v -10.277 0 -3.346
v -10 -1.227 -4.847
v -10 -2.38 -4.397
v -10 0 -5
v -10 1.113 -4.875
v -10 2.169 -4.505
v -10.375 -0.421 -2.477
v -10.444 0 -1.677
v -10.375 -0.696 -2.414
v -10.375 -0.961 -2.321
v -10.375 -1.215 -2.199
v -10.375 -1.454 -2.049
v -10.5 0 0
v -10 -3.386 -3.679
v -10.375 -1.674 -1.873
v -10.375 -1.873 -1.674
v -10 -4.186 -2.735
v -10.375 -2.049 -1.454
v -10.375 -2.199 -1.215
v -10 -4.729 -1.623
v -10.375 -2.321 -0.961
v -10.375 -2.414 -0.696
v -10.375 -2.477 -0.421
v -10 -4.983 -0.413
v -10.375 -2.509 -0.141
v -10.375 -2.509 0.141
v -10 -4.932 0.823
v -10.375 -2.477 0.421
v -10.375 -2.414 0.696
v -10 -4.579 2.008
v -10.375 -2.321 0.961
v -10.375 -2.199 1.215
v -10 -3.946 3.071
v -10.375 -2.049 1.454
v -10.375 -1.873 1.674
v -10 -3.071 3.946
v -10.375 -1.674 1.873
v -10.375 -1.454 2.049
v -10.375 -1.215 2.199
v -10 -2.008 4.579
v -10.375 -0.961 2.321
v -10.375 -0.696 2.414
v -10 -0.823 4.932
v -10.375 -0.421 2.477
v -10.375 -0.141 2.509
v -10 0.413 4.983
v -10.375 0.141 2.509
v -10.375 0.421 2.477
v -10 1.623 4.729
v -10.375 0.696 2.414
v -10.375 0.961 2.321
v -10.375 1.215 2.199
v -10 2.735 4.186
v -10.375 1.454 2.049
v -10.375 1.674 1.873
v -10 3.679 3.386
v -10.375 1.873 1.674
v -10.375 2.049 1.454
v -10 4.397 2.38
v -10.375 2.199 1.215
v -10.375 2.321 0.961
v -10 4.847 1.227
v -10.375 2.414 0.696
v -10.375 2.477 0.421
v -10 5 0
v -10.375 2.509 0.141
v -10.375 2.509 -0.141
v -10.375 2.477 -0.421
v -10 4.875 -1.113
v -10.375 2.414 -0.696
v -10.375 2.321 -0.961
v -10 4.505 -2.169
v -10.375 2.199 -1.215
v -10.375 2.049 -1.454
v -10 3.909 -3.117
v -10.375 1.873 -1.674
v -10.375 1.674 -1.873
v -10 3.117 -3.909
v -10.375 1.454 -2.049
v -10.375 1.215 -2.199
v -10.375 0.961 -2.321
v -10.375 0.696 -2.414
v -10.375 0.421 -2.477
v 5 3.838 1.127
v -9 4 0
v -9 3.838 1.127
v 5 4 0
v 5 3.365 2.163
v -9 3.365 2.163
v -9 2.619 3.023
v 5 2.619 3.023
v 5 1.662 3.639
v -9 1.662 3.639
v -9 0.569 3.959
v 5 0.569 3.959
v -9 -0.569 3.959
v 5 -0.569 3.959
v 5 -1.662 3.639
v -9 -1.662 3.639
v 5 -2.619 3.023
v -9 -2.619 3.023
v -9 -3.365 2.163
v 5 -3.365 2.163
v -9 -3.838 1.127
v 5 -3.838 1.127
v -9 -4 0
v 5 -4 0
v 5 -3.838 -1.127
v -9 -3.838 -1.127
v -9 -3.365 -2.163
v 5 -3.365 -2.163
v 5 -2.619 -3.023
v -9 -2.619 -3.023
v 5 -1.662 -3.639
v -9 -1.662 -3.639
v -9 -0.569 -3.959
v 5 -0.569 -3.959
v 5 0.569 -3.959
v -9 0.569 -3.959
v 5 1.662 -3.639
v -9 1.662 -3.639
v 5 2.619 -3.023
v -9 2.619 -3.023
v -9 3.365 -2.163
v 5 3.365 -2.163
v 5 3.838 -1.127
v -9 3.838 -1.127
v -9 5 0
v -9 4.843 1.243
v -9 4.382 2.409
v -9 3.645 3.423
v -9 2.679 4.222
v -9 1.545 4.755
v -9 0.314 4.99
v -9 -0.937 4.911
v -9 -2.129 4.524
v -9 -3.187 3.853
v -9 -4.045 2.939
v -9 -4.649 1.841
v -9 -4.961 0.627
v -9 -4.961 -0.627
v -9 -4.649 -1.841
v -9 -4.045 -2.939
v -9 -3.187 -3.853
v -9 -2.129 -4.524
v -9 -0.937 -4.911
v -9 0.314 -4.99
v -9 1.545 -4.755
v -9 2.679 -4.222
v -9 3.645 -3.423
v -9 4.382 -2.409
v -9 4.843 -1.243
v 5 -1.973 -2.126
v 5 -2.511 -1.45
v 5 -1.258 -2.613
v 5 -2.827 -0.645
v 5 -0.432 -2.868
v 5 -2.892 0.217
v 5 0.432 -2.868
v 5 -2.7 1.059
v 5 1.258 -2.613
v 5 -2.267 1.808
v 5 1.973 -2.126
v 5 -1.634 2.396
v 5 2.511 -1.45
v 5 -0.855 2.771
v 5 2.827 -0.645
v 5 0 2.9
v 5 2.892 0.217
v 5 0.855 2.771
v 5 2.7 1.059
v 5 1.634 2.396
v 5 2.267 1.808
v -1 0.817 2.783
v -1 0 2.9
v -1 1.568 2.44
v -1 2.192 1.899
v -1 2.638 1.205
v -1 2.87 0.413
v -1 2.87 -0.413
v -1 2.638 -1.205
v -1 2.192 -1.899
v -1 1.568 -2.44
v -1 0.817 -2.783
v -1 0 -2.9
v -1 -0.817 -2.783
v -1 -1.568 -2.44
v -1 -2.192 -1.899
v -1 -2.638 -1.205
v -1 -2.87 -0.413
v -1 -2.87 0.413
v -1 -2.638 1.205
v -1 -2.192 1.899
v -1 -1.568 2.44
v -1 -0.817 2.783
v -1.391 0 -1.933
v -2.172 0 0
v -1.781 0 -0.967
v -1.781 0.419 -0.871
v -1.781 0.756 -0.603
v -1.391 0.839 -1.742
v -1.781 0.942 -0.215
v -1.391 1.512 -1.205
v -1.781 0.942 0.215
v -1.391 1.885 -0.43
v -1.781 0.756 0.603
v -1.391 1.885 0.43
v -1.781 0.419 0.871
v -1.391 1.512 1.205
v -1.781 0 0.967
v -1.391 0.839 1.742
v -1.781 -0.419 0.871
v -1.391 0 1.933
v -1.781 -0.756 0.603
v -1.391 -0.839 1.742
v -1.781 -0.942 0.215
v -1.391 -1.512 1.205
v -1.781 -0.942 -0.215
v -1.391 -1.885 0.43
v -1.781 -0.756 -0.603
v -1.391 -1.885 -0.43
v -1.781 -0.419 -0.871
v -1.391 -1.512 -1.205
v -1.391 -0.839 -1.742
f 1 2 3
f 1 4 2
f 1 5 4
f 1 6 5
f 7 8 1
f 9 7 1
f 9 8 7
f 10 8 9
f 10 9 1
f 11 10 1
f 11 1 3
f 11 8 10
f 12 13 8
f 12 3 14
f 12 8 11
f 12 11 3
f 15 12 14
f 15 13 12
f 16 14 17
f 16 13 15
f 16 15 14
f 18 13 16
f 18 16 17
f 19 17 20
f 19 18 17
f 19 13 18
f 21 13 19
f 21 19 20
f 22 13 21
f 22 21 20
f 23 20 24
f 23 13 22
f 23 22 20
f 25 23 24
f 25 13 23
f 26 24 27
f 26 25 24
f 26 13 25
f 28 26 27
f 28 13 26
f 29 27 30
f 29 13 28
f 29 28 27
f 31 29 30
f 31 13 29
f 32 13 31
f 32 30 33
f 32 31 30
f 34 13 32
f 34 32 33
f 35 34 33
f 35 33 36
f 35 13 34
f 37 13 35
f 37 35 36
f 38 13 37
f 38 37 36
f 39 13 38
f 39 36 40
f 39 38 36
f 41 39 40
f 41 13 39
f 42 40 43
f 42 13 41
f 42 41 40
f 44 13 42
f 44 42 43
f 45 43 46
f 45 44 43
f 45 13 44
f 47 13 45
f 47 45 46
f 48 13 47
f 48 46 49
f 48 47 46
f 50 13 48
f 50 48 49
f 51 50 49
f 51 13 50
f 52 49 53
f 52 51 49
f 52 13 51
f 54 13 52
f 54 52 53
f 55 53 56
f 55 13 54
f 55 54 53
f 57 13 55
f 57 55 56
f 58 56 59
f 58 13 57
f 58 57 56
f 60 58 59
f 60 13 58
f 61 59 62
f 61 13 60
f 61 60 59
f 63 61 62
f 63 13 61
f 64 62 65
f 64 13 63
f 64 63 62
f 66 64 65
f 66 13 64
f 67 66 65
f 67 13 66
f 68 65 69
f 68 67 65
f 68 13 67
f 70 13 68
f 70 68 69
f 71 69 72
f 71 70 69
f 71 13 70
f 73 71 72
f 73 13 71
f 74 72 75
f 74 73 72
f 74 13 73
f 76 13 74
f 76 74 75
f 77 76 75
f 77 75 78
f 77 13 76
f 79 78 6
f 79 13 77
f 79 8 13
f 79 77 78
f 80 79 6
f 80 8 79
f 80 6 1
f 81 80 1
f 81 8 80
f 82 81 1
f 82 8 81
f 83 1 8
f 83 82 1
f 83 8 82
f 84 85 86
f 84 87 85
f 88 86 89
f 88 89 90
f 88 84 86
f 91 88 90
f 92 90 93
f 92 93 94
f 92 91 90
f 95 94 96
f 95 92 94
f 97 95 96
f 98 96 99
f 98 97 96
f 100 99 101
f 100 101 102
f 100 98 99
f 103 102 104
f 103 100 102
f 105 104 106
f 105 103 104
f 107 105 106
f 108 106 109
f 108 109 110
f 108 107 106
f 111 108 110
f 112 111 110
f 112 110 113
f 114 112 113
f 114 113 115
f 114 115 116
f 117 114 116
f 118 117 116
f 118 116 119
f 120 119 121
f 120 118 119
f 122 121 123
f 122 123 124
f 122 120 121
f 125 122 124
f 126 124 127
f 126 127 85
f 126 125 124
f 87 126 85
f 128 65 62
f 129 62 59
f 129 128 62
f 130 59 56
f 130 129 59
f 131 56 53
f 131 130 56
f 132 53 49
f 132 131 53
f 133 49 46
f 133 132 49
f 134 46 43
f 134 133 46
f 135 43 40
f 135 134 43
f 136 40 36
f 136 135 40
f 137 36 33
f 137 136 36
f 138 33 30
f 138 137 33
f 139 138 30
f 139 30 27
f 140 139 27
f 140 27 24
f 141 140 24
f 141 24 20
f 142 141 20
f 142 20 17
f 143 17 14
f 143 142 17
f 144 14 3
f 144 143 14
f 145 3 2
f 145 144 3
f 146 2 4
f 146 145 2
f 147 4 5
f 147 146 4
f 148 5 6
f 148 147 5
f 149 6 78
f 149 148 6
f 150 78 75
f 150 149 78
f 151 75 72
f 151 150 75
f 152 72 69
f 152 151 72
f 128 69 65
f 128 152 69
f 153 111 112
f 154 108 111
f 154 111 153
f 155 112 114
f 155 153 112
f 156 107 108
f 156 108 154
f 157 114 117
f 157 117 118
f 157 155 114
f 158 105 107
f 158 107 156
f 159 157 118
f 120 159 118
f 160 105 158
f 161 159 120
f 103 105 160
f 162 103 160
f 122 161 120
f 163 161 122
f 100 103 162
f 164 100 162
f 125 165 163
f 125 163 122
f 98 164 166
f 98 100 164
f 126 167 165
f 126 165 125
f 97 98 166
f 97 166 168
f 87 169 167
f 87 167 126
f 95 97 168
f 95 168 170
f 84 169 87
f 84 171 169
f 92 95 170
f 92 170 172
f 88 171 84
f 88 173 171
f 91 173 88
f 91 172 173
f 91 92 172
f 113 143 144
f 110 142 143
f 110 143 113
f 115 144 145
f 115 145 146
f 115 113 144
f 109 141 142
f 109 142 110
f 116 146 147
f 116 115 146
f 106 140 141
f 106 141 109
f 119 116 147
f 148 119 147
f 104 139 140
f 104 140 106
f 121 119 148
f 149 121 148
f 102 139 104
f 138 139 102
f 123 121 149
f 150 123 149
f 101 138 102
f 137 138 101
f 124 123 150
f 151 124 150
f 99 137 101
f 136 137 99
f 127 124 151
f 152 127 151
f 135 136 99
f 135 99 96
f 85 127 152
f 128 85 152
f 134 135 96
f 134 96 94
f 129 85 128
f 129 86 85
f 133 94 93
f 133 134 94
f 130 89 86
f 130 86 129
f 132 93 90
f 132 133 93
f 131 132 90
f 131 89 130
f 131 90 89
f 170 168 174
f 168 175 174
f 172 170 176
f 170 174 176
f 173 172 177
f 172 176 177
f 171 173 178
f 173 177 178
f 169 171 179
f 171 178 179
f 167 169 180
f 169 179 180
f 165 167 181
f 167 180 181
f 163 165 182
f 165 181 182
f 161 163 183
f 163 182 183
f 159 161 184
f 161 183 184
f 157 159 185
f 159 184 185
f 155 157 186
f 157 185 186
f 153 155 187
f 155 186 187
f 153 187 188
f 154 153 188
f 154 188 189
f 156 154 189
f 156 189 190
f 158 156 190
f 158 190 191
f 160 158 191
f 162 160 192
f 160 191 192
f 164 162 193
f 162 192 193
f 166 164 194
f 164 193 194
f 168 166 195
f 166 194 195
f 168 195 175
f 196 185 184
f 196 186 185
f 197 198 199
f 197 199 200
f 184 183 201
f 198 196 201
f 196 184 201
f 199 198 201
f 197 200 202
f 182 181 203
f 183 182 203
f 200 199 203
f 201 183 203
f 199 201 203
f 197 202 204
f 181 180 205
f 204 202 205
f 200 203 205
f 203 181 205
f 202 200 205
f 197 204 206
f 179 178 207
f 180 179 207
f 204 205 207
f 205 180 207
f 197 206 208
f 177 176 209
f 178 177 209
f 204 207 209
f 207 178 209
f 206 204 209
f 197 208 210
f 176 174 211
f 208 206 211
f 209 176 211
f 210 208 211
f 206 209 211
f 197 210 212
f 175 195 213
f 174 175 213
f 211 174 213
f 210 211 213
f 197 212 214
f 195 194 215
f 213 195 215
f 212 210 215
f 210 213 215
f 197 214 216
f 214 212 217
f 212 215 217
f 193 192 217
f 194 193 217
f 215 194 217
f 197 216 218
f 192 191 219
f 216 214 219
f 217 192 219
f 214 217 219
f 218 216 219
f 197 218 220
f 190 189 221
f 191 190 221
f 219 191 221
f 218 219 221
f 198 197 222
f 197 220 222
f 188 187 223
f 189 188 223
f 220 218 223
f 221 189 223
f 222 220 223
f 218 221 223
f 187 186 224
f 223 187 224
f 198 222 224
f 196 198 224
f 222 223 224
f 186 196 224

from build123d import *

# Parameters (mm, degrees)
FURO_COM_FOLGA_DE_M51_D     = 5.8
FURO_COM_FOLGA_DE_M51_DEPTH = 6
FURO_COM_FOLGA_DE_M51_TIP   = 1.171676055
DOMO1_FACE_RADIUS           = 5
DOMO1_HEIGHT                = 0.5


with BuildPart() as part:
    # Sketch2 → Revolve1 (revolve)
    with BuildSketch(Plane.XY):
        Polygon((-10, 0), (-10, 5), (-9, 5), (-9, 4), (5, 4), (5, 0), align=None)
    revolve(axis=Axis((-33.61911958, 0, 0), (1, 0, 0)))

    # Furo com folga de M51
    with Locations(Plane(origin=(5, 0, 0), x_dir=(0, 0, -1), z_dir=(1, 0, 0))):
        with Locations((0, 0)):
            Hole(FURO_COM_FOLGA_DE_M51_D / 2, depth=FURO_COM_FOLGA_DE_M51_DEPTH)
            with Locations((0, 0, -(FURO_COM_FOLGA_DE_M51_DEPTH + FURO_COM_FOLGA_DE_M51_TIP / 2))):  # 136° drill point
                Cone(0, FURO_COM_FOLGA_DE_M51_D / 2, FURO_COM_FOLGA_DE_M51_TIP, mode=Mode.SUBTRACT)

    # Domo1: a dome of height H over a round flat face of radius A is a cap of a sphere of radius (A * A + H * H) / (2 * H)
    domo1_r = (DOMO1_FACE_RADIUS * DOMO1_FACE_RADIUS + DOMO1_HEIGHT * DOMO1_HEIGHT) / (2 * DOMO1_HEIGHT)
    domo1_base = Plane((-10, 0, 0), z_dir=(-1, 0, 0))
    with Locations(domo1_base.offset(DOMO1_HEIGHT - domo1_r)):
        domo1_ball = Sphere(domo1_r, mode=Mode.PRIVATE)
    add(split(domo1_ball, bisect_by=domo1_base, keep=Keep.TOP, mode=Mode.PRIVATE))


solid = part.part
